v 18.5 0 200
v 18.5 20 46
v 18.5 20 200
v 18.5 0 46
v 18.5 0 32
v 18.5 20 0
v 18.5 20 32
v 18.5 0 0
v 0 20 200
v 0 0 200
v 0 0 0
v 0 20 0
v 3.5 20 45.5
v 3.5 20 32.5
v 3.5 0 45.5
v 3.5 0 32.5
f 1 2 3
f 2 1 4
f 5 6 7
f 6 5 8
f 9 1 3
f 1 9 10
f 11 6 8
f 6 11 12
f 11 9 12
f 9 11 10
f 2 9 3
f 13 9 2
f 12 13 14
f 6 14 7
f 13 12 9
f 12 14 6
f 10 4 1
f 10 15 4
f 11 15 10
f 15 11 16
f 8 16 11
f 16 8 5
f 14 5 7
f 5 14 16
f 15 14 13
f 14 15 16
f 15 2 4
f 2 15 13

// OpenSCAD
// ============================================================================
//  MASKOWNICA - prostopadłościan z trapezowym wycięciem w prawym dolnym rogu
// ============================================================================
//  Wszystkie wymiary w milimetrach [mm].
//
//  Układ współrzędnych:
//    X - szerokość   : 0 = lewa krawędź,   width  = prawa krawędź
//    Y - głębokość   : 0 = przód,          depth  = tył
//    Z - wysokość    : 0 = dół,            height = góra
//
//  Wycięcie (trapez) leży w prawym dolnym rogu i przechodzi NA WYLOT
//  przez całą głębokość. Jest wyśrodkowane pionowo:
//    - na krawędzi bryły (x = width) ma wysokość `cut_edge_h`,
//    - w głębi (x = width - cut_in_width) ma wysokość `cut_inner_h`.
// ============================================================================

/* [Główne wymiary maskownicy] */
depth   = 20;    // głębokość
width   = 18.5;  // szerokość
height  = 200;   // wysokość

/* [Wycięcie (trapez) - prawy dolny róg] */
cut_start_z  = 32;  // wysokość, na której zaczyna się wycięcie (od dołu)
cut_edge_h   = 14;  // wysokość wycięcia na krawędzi prostopadłościanu
cut_in_width = 15;  // zasięg wycięcia w głąb od prawej krawędzi
cut_inner_h  = 13;  // wysokość wycięcia na końcu (w głębi), wyśrodkowana

/* [Ustawienia ogólne] */
$fn = 64;

// ---------------------------------------------------------------------------
//  Geometria wycięcia (wyliczana z powyższych parametrów - nie zmieniaj ręcznie)
// ---------------------------------------------------------------------------
// Środek wycięcia na krawędzi bryły oraz pionowe granice na krawędzi i w głębi.
cut_center    = cut_start_z + cut_edge_h / 2;   // pionowy środek wycięcia
cut_edge_bot  = cut_start_z;                    // dolna krawędź na krawędzi bryły
cut_edge_top  = cut_start_z + cut_edge_h;       // górna krawędź na krawędzi bryły
cut_inner_bot = cut_center - cut_inner_h / 2;   // dolna krawędź w głębi (wyśrodkowana)
cut_inner_top = cut_center + cut_inner_h / 2;   // górna krawędź w głębi (wyśrodkowana)

x_right = width;                 // prawa krawędź prostopadłościanu
x_inner = width - cut_in_width;  // krawędź wycięcia w głębi bryły

// Narożniki trapezu, patrząc na ścianę 18.5 x 200 mm:
//   [w głębi - dół] -> [na krawędzi - dół] -> [na krawędzi - góra] -> [w głębi - góra]
trapez_points = [
    [x_inner, cut_inner_bot],
    [x_right, cut_edge_bot],
    [x_right, cut_edge_top],
    [x_inner, cut_inner_top],
];

// Zapas tak, aby wycięcie na pewno przebiło bryłę na wylot (bez artefaktów).
eps = 1;

// ---------------------------------------------------------------------------
//  Bryła
// ---------------------------------------------------------------------------
module maskownica() {
    difference() {
        // Prostopadłościan bazowy
        cube([width, depth, height]);

        // Trapezowe wycięcie na wylot przez całą głębokość.
        // rotate([90,0,0]) obraca wyciągnięty profil (w płaszczyźnie XZ)
        // tak, że wyciągnięcie biegnie wzdłuż osi Y; translate ustawia je
        // w zakresie od -eps do depth+eps, czyli z zapasem po obu stronach.
        translate([0, depth + eps, 0])
            rotate([90, 0, 0])
                linear_extrude(height = depth + 2 * eps)
                    polygon(points = trapez_points);
    }
}

maskownica();
